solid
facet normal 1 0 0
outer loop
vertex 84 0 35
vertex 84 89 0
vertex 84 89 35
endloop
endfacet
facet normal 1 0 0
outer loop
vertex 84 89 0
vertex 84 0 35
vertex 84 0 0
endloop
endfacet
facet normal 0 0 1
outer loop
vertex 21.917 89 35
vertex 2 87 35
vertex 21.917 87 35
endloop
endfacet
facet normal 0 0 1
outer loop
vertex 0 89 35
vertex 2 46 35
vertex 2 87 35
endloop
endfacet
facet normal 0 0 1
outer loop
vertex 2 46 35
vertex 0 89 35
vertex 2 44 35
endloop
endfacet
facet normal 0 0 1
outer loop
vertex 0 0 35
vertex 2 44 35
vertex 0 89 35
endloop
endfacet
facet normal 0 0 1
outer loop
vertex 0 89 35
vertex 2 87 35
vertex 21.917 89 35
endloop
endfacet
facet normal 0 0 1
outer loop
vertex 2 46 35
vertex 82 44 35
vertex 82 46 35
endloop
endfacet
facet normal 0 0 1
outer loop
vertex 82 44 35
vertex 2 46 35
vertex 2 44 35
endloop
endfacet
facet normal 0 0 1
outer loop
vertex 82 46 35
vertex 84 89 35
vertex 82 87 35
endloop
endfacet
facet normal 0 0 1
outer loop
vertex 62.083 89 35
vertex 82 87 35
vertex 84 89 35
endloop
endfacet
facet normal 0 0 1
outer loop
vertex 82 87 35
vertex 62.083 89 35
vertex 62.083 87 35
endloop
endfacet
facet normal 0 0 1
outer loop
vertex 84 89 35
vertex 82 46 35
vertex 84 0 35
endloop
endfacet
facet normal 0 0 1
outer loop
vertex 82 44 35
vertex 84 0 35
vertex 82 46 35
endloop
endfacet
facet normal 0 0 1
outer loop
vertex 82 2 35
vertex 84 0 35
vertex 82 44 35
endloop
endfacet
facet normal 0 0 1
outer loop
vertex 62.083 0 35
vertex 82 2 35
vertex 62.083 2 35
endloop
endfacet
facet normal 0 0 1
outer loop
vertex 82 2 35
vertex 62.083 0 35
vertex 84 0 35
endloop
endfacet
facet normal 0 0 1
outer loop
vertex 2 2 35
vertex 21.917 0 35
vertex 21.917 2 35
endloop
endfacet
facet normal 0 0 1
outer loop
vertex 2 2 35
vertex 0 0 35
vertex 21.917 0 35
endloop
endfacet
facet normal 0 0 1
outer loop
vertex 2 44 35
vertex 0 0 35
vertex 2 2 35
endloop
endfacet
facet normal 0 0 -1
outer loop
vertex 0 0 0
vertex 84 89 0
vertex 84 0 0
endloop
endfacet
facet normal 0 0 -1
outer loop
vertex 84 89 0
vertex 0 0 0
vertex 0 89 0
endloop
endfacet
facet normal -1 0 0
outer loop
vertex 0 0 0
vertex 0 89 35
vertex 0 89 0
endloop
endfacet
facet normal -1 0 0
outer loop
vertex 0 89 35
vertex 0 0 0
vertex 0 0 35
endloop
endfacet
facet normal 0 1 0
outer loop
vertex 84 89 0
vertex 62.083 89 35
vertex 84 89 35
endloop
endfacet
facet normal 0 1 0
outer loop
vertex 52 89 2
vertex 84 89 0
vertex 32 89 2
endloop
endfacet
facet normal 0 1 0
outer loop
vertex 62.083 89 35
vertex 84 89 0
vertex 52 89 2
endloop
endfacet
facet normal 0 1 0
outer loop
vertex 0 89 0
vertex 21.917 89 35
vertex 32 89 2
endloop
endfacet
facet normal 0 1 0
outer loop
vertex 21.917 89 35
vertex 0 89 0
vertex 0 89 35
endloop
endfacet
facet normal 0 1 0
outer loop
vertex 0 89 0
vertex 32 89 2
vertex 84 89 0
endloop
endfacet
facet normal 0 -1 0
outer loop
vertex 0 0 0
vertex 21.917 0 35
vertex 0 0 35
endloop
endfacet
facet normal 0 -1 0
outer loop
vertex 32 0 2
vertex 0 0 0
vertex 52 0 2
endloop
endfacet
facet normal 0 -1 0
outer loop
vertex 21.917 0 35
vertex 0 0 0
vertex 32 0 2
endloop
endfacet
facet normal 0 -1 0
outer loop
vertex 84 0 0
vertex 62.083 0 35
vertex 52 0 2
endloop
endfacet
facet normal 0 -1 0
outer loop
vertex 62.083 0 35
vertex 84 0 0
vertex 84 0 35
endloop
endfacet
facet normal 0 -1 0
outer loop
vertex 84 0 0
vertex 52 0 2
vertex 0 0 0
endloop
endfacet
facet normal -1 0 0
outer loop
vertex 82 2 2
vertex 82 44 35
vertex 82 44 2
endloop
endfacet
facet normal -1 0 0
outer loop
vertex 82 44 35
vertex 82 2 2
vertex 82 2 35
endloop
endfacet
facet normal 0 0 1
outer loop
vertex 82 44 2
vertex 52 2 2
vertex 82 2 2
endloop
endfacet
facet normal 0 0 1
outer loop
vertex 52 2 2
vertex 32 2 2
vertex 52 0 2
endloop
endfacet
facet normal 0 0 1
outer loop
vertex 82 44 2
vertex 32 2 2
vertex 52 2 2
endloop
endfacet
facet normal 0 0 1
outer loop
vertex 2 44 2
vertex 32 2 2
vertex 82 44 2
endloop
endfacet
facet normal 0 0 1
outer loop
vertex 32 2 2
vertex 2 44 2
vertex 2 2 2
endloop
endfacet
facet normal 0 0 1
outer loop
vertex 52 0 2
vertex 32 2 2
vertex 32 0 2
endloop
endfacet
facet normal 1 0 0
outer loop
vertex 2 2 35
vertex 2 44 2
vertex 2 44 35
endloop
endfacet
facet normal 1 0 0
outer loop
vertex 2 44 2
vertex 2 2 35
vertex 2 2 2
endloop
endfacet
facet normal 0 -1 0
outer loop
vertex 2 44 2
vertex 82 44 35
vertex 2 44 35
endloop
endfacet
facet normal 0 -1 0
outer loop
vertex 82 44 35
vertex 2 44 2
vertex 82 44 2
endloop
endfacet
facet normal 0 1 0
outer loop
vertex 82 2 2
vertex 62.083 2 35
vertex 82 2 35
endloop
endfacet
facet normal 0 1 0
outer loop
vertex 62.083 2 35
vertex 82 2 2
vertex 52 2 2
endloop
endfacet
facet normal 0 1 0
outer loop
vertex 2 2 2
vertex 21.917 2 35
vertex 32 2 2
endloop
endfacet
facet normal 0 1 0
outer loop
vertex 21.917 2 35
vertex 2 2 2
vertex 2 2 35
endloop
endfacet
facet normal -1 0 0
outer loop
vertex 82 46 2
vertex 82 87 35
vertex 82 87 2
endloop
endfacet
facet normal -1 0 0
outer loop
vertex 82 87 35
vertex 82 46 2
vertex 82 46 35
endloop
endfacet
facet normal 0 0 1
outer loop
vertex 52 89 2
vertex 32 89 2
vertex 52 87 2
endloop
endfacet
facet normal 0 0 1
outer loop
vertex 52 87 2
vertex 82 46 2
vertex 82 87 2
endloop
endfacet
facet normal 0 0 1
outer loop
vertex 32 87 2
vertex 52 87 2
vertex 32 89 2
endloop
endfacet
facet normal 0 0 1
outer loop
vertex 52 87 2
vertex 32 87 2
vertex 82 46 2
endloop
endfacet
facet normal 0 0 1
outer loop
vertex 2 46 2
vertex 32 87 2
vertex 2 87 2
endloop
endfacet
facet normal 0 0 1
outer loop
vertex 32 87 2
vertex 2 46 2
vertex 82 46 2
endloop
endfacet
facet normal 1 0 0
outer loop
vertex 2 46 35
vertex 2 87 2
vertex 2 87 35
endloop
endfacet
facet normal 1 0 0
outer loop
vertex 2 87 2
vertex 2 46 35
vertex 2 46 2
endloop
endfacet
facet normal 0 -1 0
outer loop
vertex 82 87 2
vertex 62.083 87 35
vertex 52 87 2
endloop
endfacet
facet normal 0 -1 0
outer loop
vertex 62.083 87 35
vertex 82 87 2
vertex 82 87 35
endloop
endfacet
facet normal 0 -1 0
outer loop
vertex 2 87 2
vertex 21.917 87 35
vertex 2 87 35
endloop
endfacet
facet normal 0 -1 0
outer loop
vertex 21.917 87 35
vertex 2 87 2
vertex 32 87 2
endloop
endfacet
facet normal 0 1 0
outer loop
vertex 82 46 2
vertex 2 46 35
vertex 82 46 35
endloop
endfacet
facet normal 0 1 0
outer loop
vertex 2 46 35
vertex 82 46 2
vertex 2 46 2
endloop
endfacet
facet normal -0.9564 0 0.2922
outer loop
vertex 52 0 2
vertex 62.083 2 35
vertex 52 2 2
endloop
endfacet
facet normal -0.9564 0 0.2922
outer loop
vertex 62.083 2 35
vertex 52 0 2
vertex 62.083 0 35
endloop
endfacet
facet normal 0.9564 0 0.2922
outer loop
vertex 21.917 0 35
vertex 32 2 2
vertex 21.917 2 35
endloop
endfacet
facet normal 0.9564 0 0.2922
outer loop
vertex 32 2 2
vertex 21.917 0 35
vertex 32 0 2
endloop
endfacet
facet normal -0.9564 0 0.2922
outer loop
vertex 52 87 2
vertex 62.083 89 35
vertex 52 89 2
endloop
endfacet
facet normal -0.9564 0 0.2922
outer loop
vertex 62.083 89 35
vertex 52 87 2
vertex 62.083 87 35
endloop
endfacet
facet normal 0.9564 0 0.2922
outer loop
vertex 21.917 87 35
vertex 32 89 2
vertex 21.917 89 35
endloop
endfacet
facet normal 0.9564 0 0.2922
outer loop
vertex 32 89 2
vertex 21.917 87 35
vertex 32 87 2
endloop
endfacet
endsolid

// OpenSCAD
// file: notch.scad
/**
a notch is a trapezoidal prism which will be "subtracted"
from a wall to create an opening

parameters:

top: how wide the top of the trapezoid is
bottom: how wide the bottom of the trapezoid is
tall: how tall the wall is
thich: how thick the wall is

the notch will be created with the botto
*/

module notch(top, bottom, tall, thick) {
		x = 0.5 * (bottom-top);
		// translate to make the bottom start at 0,0
		translate([0, thick, 0]) {
				// rotate because linear extrude extrudes along the
				// z axis and we want it along the y axis
				rotate([90,0,0]) {
						linear_extrude(height=thick) {
								polygon(points=[[0,0], [bottom,0], [bottom-x,tall], [x,tall]]);
						}
				}
		}


}
// main file
wall = 2;

use<notch.scad>;

module expansions() {

		difference() {

				cube([84, 89, 35]);
				translate([wall, wall, wall]) {
						cube([80, 42, 35]);
				}

				translate([wall, 2*wall + 42, wall]) {
						cube([80, 41, 35]);
				}

				translate([32, -1, wall]) { // should be 34, 0, wall but tweak slack
						notch(42, 20, 38 - wall, 2*wall); // should be 30 - wall, wall, tweak
				}

				translate([32, 89 - (3*wall) - 1, wall]) { // should be 34, 0, wall but tweak slack
						notch(42, 20, 38 - wall, 4*wall); // should be 30 - wall, wall, tweak
				}

		}

}

expansions();
